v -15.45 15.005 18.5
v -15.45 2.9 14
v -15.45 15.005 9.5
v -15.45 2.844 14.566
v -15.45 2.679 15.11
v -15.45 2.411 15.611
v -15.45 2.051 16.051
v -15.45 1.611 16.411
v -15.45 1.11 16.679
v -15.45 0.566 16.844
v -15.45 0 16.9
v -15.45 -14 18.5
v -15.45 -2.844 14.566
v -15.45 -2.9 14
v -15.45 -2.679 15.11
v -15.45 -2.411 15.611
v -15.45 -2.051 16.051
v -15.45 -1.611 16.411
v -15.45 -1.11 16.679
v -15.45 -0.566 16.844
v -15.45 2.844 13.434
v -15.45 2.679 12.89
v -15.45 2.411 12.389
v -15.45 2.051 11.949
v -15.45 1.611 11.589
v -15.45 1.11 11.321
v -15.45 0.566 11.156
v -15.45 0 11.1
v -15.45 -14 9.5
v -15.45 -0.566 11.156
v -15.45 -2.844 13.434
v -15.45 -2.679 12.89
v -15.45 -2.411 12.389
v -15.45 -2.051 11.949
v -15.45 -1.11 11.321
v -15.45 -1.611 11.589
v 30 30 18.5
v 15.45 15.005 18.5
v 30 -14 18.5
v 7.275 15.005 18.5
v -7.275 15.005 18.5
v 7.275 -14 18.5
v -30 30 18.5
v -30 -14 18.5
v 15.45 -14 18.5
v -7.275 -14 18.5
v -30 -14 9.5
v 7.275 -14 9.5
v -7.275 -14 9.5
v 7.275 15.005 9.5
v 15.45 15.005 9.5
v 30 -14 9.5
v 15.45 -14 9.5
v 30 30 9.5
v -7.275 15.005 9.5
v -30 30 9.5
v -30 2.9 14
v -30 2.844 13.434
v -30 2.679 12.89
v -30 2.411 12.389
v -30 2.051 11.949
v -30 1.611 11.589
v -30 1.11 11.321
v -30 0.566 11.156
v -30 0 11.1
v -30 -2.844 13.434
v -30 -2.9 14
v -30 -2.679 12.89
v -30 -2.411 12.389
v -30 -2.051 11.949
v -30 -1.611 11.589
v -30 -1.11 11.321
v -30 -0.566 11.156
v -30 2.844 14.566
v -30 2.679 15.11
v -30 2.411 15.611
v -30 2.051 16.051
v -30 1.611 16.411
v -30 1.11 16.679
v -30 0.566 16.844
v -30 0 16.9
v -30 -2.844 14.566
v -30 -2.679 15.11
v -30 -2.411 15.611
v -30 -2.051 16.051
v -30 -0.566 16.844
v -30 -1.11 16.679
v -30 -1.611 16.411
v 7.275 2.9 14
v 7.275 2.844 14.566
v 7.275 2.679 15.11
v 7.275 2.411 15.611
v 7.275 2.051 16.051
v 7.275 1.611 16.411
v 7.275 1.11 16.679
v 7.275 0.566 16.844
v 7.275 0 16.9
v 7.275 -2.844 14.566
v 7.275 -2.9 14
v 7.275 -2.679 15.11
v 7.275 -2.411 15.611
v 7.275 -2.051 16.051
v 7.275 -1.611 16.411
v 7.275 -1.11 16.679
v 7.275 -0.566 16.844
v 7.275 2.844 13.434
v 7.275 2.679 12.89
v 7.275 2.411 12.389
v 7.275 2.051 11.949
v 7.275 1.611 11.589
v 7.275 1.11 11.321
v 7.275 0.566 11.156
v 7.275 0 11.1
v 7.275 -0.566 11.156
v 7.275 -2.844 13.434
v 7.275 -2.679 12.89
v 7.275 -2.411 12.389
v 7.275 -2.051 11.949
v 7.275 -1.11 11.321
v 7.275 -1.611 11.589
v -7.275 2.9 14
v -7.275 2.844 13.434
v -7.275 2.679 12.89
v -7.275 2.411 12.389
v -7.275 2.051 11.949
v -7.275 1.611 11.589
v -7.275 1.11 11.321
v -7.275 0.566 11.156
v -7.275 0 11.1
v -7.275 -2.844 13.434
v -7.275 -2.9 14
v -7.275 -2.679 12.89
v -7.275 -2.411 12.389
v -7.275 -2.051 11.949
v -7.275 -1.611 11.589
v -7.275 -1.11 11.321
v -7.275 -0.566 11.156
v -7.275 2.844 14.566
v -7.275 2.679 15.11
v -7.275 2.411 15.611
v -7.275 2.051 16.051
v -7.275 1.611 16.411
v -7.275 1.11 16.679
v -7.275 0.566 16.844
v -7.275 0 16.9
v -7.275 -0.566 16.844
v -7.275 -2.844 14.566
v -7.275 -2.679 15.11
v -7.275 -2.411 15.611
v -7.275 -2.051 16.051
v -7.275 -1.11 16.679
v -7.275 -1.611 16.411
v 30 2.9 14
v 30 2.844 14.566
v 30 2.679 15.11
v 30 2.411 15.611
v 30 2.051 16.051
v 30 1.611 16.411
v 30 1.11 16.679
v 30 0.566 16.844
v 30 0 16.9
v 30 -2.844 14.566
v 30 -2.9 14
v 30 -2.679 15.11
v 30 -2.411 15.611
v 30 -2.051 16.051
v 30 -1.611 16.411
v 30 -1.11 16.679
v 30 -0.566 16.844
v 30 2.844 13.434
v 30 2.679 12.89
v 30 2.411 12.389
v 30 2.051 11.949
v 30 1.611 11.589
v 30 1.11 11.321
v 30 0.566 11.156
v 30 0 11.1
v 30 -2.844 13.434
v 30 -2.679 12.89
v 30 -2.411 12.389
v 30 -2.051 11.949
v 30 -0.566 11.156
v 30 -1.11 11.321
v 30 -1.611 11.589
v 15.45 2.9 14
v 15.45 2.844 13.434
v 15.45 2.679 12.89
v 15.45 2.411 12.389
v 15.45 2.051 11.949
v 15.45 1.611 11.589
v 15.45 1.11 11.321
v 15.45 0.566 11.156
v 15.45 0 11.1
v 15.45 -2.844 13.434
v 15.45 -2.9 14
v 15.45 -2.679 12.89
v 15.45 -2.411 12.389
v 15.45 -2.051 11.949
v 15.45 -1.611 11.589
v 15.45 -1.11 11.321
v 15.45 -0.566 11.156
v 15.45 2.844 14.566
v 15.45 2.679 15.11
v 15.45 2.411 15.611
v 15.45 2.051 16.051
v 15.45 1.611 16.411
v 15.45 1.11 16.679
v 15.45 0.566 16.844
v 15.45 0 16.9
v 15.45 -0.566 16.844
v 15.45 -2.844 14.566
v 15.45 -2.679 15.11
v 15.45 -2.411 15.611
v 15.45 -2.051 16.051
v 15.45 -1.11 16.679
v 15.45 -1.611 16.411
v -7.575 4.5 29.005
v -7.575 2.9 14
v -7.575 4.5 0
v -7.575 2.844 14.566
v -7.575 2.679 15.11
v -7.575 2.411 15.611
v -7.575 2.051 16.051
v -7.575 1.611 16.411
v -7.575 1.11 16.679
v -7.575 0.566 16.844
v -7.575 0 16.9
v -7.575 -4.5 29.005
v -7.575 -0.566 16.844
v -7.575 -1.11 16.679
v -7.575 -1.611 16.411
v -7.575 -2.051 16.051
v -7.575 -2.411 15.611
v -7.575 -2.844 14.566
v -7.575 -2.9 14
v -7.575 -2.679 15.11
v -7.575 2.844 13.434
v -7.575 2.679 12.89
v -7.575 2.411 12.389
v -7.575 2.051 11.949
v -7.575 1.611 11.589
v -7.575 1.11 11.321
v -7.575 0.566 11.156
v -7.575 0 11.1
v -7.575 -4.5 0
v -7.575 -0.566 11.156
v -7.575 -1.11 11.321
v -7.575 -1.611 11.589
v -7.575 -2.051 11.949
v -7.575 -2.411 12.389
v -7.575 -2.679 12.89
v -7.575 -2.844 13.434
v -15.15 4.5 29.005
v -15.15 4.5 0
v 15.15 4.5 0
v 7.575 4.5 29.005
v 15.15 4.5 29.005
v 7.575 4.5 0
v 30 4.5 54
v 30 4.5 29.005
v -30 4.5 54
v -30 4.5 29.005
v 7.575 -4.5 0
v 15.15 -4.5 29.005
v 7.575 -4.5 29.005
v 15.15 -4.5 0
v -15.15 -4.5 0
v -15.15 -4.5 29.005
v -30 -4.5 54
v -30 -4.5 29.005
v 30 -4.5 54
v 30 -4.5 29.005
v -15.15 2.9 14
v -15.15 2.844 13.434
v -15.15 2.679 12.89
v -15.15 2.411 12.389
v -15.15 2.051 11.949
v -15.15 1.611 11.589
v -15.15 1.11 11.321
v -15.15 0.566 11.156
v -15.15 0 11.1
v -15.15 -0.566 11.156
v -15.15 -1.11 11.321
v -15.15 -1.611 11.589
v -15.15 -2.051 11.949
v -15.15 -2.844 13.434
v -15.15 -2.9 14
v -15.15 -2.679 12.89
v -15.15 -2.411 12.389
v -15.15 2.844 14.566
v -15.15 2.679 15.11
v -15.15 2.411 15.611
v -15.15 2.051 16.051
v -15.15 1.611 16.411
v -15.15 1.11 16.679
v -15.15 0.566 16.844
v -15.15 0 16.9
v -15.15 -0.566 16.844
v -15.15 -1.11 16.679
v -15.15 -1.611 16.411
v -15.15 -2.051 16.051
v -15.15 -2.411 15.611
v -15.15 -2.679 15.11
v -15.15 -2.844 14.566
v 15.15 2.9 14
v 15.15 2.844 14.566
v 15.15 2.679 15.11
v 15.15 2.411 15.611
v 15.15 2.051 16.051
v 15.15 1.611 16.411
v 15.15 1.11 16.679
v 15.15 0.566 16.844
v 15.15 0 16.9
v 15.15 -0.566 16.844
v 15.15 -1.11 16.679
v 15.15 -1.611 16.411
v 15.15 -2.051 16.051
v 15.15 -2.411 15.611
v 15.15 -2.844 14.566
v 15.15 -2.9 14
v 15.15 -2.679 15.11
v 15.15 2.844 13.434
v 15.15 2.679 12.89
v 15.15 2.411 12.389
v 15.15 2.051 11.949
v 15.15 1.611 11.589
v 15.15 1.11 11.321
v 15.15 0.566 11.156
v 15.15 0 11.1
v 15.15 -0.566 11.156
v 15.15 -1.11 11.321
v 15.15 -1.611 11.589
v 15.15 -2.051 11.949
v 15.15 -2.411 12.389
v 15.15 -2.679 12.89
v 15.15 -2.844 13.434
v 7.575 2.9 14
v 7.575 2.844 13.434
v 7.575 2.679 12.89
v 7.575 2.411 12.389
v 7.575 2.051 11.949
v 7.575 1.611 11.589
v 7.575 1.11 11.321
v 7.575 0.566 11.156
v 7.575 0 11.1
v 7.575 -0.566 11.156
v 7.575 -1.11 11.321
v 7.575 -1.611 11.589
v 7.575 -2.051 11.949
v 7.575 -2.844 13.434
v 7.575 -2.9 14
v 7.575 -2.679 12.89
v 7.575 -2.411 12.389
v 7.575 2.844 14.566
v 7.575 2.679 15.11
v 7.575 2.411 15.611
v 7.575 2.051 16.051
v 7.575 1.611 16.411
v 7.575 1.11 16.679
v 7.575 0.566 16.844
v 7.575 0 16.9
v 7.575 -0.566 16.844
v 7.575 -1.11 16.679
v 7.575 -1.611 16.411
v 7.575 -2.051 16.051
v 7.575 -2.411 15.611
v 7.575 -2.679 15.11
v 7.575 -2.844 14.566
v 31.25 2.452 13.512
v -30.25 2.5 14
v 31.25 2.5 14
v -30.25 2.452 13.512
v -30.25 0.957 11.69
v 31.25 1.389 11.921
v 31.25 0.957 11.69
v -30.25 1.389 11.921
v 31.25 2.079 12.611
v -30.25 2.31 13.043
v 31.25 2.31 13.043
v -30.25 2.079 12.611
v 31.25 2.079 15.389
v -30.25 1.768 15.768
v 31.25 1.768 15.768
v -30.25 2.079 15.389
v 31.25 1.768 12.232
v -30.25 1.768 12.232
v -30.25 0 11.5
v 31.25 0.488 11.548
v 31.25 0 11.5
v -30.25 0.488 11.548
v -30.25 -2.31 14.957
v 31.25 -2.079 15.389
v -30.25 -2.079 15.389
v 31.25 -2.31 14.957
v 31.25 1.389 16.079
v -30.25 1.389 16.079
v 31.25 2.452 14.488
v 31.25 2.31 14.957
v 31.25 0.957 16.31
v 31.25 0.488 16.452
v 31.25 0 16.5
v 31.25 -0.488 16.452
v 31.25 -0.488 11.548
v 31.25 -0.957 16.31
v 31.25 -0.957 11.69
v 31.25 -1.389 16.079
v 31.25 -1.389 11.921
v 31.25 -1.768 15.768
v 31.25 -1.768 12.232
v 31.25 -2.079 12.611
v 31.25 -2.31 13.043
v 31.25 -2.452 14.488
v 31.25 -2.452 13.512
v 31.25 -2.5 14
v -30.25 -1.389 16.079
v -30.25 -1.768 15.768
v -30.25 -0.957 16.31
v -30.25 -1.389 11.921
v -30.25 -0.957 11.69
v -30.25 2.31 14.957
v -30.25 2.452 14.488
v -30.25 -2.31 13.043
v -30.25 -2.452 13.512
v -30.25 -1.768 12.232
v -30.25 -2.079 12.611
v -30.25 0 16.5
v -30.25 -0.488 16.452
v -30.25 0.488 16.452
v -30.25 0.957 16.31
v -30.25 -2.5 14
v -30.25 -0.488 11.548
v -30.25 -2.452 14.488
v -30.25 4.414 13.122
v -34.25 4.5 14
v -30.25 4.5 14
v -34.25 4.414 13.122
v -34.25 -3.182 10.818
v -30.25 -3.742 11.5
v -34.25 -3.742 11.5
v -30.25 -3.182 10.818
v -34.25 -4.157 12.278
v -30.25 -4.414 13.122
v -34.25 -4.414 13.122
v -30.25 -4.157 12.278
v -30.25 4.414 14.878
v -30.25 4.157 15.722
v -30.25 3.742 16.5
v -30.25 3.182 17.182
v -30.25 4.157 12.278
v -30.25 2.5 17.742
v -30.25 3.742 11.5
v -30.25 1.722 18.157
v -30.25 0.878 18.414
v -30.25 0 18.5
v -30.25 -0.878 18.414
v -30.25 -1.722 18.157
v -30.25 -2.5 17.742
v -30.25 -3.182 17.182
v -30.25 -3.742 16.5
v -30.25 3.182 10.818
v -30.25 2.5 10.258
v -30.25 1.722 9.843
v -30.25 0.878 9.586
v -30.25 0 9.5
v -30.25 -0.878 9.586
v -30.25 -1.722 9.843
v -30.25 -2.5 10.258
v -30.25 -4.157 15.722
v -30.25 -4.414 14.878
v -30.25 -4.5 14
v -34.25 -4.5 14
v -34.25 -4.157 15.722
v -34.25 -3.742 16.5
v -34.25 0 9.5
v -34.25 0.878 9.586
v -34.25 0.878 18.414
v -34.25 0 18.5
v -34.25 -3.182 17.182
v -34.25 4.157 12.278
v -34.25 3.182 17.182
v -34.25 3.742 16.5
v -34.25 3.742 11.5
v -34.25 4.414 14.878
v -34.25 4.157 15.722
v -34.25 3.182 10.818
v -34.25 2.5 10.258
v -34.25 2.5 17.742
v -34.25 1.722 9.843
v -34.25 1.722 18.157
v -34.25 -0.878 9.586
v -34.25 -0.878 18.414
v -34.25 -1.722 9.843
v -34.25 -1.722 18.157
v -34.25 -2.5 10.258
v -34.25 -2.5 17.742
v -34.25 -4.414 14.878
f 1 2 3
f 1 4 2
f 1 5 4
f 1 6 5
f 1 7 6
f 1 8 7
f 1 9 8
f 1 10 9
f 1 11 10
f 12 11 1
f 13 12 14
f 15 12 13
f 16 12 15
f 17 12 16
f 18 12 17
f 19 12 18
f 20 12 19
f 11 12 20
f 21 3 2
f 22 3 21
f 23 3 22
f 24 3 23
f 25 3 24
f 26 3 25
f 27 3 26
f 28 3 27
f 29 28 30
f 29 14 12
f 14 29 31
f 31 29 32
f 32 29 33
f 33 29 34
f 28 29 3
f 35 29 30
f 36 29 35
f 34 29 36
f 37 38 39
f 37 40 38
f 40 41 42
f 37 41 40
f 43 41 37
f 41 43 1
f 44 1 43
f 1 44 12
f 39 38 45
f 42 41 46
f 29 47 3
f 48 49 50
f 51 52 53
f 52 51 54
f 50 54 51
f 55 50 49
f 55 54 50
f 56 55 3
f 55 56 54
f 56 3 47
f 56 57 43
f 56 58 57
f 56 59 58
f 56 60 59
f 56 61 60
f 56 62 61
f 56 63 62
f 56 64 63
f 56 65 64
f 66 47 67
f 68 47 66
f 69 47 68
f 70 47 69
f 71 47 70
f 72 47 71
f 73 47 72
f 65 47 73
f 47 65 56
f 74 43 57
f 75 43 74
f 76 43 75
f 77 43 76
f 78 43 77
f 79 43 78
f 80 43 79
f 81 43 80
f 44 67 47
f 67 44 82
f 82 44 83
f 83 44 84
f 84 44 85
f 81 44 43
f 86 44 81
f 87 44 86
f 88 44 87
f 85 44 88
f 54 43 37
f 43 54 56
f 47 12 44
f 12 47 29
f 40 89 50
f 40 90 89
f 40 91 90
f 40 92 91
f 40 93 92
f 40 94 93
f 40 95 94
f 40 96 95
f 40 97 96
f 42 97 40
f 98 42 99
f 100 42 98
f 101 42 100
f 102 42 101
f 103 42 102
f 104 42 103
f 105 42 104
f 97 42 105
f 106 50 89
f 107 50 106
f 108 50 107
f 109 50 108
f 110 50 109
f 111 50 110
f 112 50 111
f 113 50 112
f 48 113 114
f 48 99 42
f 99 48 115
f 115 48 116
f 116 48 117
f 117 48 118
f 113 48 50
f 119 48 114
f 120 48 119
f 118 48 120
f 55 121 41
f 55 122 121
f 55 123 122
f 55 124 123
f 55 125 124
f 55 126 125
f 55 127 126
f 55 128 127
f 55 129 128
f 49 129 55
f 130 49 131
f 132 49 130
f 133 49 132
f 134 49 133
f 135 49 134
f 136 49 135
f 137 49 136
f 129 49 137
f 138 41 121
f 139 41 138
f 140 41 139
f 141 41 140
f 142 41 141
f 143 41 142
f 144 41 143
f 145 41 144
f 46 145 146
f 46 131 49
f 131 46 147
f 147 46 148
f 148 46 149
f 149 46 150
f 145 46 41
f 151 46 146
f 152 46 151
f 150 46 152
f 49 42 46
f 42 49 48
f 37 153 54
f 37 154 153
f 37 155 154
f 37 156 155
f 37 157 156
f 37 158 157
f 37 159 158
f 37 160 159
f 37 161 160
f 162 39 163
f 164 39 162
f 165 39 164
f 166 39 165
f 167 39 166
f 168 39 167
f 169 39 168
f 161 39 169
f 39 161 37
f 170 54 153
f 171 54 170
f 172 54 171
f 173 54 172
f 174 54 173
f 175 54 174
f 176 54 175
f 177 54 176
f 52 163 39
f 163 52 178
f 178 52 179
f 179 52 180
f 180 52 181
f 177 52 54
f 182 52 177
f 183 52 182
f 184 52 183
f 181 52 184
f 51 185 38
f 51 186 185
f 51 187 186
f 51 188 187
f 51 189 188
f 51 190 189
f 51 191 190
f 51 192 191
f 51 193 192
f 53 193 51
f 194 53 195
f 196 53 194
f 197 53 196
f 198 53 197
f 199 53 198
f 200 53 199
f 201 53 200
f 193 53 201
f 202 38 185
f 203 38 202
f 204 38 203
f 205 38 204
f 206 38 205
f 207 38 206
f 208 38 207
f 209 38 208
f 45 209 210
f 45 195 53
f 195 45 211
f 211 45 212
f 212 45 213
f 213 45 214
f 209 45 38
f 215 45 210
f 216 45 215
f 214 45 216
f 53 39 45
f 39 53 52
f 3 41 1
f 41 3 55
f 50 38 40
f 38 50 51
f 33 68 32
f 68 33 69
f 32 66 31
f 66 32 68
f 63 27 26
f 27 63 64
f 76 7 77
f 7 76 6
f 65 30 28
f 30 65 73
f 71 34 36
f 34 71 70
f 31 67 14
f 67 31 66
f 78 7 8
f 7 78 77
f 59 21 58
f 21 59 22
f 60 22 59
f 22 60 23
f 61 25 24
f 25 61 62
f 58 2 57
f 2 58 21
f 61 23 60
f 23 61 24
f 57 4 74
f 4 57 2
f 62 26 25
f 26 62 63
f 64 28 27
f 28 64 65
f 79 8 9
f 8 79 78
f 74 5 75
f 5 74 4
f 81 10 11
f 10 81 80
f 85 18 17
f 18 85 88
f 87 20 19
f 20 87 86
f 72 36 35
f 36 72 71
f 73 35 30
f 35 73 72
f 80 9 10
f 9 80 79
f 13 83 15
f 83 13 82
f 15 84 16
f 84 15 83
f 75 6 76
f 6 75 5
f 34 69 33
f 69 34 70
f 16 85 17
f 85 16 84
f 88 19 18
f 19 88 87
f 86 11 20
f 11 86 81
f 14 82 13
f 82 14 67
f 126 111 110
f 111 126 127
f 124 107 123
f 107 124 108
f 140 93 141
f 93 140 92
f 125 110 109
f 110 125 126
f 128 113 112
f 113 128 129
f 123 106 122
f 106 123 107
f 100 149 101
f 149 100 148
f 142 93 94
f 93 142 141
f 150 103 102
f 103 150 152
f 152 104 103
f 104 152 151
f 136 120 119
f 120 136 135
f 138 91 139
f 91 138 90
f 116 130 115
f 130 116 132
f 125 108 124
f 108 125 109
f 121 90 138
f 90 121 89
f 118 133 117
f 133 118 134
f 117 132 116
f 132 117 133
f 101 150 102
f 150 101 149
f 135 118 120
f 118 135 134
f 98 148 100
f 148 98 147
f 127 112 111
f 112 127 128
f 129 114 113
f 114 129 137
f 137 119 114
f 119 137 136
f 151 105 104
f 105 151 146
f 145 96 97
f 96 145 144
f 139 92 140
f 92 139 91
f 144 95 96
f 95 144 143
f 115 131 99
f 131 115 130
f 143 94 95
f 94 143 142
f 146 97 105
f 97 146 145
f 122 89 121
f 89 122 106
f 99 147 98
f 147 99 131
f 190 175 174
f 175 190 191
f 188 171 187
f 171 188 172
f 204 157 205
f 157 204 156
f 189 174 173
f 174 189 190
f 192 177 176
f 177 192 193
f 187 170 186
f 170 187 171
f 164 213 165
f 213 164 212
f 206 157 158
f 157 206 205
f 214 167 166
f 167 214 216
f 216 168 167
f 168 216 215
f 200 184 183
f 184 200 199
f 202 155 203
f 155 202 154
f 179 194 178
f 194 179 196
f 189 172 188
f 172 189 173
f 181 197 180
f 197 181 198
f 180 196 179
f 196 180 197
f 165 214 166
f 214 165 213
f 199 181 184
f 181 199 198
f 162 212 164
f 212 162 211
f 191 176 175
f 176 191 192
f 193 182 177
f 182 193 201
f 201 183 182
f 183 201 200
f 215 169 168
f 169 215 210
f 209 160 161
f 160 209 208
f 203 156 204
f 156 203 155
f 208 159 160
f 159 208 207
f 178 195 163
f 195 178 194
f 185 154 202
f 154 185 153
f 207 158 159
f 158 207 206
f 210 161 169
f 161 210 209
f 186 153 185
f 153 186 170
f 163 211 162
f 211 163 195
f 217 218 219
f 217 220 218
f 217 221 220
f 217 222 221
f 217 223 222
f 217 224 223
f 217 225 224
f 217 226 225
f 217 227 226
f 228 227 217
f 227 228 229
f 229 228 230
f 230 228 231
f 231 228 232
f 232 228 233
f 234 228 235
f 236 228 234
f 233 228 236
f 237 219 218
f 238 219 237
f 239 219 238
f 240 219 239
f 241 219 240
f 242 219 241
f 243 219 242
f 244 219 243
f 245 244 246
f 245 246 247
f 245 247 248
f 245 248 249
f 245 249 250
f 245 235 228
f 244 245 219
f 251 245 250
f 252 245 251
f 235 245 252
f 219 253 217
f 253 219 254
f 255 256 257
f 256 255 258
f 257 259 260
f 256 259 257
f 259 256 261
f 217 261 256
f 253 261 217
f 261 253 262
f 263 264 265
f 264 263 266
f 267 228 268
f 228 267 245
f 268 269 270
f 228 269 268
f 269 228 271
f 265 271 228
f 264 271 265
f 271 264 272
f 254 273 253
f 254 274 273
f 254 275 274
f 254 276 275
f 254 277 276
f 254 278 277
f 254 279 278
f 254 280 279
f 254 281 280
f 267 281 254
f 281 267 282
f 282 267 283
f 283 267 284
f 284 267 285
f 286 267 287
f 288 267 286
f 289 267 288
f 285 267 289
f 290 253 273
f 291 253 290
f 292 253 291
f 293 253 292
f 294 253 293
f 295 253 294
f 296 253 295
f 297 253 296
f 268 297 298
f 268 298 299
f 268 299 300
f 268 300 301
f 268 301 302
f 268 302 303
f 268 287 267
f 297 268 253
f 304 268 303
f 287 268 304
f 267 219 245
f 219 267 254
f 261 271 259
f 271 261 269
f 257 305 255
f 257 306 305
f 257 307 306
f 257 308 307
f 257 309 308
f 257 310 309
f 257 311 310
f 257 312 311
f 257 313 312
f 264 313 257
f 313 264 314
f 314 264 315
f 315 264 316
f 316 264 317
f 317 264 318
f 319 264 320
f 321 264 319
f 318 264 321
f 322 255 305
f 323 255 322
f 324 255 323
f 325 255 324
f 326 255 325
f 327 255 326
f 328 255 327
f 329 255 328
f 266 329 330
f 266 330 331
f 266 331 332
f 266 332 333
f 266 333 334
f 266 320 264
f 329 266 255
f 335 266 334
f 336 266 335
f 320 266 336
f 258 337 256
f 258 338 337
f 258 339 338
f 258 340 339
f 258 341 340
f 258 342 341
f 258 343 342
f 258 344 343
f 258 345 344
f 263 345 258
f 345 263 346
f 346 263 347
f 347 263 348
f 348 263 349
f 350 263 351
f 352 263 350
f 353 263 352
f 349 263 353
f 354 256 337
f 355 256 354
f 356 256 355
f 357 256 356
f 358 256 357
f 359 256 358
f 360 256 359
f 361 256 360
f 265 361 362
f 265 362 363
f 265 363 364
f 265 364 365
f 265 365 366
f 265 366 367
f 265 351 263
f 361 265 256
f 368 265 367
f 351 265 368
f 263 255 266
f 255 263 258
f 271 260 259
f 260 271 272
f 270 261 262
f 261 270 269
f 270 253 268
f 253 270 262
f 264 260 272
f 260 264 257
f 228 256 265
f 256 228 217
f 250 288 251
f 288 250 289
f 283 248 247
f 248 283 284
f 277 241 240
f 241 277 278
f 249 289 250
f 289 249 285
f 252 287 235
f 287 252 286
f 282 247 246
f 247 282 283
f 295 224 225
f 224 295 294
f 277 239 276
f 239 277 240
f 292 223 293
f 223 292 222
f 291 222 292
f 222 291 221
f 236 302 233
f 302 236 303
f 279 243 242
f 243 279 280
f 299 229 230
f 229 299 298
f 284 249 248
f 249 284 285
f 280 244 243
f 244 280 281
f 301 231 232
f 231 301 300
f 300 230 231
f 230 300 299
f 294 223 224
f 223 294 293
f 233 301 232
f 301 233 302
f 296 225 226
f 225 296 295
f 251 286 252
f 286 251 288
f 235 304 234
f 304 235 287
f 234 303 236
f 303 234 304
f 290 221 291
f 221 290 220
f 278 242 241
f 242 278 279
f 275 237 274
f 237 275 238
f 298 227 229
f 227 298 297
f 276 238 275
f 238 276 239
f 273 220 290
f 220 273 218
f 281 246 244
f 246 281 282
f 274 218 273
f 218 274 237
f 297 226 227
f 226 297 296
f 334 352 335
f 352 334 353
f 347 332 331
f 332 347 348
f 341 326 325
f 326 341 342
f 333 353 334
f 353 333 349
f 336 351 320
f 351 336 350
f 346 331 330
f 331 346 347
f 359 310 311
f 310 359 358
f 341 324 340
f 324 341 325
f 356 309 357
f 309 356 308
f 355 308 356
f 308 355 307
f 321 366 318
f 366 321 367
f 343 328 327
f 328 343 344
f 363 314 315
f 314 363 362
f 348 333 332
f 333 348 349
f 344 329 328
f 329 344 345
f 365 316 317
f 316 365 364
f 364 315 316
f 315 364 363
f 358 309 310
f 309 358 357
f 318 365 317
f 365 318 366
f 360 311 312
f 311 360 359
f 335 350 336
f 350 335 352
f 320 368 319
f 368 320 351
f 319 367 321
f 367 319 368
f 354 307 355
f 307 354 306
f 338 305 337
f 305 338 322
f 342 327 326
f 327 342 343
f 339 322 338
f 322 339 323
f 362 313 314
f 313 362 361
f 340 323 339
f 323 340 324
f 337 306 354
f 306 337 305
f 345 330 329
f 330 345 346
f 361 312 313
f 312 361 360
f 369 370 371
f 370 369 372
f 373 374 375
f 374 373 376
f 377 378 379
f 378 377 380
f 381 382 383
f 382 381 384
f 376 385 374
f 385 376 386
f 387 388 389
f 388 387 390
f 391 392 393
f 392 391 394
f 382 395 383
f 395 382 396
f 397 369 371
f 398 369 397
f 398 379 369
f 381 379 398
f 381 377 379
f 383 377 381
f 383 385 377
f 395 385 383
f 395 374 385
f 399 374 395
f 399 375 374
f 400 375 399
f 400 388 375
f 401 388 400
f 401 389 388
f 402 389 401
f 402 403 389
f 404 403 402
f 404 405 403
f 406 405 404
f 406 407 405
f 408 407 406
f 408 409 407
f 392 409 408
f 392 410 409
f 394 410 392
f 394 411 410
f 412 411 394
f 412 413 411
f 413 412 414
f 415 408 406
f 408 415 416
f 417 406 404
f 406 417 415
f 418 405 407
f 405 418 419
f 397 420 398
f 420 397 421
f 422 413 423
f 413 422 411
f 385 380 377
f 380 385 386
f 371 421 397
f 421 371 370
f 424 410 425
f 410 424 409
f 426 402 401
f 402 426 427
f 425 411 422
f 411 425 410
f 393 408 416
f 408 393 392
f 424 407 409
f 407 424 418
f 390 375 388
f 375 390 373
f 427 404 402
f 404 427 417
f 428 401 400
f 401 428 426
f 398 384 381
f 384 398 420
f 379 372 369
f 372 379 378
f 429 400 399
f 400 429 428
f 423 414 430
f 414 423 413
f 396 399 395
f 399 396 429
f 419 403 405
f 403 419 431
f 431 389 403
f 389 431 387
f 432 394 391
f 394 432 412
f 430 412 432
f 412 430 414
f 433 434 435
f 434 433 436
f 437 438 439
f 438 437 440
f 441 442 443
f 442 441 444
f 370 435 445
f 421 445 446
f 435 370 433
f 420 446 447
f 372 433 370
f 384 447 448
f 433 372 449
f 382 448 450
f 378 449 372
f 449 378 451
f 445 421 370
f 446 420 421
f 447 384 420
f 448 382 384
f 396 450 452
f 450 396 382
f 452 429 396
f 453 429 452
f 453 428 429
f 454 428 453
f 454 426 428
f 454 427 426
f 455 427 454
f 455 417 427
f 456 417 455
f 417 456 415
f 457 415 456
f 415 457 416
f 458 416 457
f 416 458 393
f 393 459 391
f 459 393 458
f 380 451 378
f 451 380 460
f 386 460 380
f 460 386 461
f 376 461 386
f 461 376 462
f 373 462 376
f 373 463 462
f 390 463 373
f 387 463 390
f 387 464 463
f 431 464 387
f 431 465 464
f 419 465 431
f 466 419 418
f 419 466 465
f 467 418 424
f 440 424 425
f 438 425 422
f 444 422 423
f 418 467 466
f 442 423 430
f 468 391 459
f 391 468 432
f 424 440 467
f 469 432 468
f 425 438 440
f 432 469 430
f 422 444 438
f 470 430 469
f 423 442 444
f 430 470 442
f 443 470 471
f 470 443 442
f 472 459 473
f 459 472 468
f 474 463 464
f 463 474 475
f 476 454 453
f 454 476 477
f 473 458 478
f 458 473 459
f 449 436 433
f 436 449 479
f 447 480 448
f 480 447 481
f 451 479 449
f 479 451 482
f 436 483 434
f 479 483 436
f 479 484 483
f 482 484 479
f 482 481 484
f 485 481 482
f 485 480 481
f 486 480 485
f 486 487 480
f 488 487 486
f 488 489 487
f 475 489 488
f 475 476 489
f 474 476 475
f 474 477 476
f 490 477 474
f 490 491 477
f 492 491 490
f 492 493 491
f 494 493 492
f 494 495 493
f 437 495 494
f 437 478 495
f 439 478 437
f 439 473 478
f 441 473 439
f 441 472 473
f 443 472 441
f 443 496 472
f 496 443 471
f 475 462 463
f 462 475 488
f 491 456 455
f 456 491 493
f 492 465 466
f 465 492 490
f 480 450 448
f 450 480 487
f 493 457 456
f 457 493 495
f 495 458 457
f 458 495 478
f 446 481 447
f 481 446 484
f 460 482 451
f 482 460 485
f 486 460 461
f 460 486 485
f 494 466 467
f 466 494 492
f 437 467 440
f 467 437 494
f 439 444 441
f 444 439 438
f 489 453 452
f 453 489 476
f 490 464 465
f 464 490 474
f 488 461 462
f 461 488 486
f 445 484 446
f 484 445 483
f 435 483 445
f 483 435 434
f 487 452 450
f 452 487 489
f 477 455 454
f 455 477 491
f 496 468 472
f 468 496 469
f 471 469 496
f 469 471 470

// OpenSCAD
$fn = 32;

// ------------------------------------------------------------------------
// Butt hinge: hinge 60 mm, leaf swung 270 deg
// Every part is its own module, assembly() places every instance.
// ------------------------------------------------------------------------

// --- part 1 ---
module hinge_base() {
  difference() {
    union() {
      translate([-30, -14, -4.5]) cube([14.55, 44, 9]);
      translate([-7.275, -14, -4.5]) cube([14.55, 44, 9]);
      translate([15.45, -14, -4.5]) cube([14.55, 44, 9]);
      translate([-30, 15.005, -4.5]) cube([60, 14.995, 9]);
    }
    translate([-22.725, 0, 0]) rotate([0, 90, 0]) cylinder(h = 16.55, d = 5.8, center = true);
    translate([0, 0, 0]) rotate([0, 90, 0]) cylinder(h = 16.55, d = 5.8, center = true);
    translate([22.725, 0, 0]) rotate([0, 90, 0]) cylinder(h = 16.55, d = 5.8, center = true);
  }
}

// --- part 2 ---
module hinge_mover() {
  difference() {
    union() {
      translate([-15.15, -40, -4.5]) cube([7.575, 54, 9]);
      translate([7.575, -40, -4.5]) cube([7.575, 54, 9]);
      translate([-30, -40, -4.5]) cube([60, 24.995, 9]);
    }
    translate([-11.362, 0, 0]) rotate([0, 90, 0]) cylinder(h = 9.575, d = 5.8, center = true);
    translate([11.362, 0, 0]) rotate([0, 90, 0]) cylinder(h = 9.575, d = 5.8, center = true);
  }
}

// --- part 3 ---
module hinge_pin() {
  rotate([0, 90, 0]) cylinder(h = 62.5, d = 5, center = true);
  translate([-34.25, 0, 0]) rotate([0, 90, 0]) cylinder(h = 4, d = 9);
}

// --- assembly ---
module assembly() {
  color([0.80, 0.24, 0.20]) translate([0, 0, 14]) rotate([0, 0, 0]) hinge_base();
  color([0.20, 0.45, 0.75]) translate([0, 0, 14]) rotate([270, 0, 0]) hinge_mover();
  color([0.25, 0.62, 0.32]) translate([0, 0, 14]) rotate([0, 0, 0]) hinge_pin();
}

assembly();
